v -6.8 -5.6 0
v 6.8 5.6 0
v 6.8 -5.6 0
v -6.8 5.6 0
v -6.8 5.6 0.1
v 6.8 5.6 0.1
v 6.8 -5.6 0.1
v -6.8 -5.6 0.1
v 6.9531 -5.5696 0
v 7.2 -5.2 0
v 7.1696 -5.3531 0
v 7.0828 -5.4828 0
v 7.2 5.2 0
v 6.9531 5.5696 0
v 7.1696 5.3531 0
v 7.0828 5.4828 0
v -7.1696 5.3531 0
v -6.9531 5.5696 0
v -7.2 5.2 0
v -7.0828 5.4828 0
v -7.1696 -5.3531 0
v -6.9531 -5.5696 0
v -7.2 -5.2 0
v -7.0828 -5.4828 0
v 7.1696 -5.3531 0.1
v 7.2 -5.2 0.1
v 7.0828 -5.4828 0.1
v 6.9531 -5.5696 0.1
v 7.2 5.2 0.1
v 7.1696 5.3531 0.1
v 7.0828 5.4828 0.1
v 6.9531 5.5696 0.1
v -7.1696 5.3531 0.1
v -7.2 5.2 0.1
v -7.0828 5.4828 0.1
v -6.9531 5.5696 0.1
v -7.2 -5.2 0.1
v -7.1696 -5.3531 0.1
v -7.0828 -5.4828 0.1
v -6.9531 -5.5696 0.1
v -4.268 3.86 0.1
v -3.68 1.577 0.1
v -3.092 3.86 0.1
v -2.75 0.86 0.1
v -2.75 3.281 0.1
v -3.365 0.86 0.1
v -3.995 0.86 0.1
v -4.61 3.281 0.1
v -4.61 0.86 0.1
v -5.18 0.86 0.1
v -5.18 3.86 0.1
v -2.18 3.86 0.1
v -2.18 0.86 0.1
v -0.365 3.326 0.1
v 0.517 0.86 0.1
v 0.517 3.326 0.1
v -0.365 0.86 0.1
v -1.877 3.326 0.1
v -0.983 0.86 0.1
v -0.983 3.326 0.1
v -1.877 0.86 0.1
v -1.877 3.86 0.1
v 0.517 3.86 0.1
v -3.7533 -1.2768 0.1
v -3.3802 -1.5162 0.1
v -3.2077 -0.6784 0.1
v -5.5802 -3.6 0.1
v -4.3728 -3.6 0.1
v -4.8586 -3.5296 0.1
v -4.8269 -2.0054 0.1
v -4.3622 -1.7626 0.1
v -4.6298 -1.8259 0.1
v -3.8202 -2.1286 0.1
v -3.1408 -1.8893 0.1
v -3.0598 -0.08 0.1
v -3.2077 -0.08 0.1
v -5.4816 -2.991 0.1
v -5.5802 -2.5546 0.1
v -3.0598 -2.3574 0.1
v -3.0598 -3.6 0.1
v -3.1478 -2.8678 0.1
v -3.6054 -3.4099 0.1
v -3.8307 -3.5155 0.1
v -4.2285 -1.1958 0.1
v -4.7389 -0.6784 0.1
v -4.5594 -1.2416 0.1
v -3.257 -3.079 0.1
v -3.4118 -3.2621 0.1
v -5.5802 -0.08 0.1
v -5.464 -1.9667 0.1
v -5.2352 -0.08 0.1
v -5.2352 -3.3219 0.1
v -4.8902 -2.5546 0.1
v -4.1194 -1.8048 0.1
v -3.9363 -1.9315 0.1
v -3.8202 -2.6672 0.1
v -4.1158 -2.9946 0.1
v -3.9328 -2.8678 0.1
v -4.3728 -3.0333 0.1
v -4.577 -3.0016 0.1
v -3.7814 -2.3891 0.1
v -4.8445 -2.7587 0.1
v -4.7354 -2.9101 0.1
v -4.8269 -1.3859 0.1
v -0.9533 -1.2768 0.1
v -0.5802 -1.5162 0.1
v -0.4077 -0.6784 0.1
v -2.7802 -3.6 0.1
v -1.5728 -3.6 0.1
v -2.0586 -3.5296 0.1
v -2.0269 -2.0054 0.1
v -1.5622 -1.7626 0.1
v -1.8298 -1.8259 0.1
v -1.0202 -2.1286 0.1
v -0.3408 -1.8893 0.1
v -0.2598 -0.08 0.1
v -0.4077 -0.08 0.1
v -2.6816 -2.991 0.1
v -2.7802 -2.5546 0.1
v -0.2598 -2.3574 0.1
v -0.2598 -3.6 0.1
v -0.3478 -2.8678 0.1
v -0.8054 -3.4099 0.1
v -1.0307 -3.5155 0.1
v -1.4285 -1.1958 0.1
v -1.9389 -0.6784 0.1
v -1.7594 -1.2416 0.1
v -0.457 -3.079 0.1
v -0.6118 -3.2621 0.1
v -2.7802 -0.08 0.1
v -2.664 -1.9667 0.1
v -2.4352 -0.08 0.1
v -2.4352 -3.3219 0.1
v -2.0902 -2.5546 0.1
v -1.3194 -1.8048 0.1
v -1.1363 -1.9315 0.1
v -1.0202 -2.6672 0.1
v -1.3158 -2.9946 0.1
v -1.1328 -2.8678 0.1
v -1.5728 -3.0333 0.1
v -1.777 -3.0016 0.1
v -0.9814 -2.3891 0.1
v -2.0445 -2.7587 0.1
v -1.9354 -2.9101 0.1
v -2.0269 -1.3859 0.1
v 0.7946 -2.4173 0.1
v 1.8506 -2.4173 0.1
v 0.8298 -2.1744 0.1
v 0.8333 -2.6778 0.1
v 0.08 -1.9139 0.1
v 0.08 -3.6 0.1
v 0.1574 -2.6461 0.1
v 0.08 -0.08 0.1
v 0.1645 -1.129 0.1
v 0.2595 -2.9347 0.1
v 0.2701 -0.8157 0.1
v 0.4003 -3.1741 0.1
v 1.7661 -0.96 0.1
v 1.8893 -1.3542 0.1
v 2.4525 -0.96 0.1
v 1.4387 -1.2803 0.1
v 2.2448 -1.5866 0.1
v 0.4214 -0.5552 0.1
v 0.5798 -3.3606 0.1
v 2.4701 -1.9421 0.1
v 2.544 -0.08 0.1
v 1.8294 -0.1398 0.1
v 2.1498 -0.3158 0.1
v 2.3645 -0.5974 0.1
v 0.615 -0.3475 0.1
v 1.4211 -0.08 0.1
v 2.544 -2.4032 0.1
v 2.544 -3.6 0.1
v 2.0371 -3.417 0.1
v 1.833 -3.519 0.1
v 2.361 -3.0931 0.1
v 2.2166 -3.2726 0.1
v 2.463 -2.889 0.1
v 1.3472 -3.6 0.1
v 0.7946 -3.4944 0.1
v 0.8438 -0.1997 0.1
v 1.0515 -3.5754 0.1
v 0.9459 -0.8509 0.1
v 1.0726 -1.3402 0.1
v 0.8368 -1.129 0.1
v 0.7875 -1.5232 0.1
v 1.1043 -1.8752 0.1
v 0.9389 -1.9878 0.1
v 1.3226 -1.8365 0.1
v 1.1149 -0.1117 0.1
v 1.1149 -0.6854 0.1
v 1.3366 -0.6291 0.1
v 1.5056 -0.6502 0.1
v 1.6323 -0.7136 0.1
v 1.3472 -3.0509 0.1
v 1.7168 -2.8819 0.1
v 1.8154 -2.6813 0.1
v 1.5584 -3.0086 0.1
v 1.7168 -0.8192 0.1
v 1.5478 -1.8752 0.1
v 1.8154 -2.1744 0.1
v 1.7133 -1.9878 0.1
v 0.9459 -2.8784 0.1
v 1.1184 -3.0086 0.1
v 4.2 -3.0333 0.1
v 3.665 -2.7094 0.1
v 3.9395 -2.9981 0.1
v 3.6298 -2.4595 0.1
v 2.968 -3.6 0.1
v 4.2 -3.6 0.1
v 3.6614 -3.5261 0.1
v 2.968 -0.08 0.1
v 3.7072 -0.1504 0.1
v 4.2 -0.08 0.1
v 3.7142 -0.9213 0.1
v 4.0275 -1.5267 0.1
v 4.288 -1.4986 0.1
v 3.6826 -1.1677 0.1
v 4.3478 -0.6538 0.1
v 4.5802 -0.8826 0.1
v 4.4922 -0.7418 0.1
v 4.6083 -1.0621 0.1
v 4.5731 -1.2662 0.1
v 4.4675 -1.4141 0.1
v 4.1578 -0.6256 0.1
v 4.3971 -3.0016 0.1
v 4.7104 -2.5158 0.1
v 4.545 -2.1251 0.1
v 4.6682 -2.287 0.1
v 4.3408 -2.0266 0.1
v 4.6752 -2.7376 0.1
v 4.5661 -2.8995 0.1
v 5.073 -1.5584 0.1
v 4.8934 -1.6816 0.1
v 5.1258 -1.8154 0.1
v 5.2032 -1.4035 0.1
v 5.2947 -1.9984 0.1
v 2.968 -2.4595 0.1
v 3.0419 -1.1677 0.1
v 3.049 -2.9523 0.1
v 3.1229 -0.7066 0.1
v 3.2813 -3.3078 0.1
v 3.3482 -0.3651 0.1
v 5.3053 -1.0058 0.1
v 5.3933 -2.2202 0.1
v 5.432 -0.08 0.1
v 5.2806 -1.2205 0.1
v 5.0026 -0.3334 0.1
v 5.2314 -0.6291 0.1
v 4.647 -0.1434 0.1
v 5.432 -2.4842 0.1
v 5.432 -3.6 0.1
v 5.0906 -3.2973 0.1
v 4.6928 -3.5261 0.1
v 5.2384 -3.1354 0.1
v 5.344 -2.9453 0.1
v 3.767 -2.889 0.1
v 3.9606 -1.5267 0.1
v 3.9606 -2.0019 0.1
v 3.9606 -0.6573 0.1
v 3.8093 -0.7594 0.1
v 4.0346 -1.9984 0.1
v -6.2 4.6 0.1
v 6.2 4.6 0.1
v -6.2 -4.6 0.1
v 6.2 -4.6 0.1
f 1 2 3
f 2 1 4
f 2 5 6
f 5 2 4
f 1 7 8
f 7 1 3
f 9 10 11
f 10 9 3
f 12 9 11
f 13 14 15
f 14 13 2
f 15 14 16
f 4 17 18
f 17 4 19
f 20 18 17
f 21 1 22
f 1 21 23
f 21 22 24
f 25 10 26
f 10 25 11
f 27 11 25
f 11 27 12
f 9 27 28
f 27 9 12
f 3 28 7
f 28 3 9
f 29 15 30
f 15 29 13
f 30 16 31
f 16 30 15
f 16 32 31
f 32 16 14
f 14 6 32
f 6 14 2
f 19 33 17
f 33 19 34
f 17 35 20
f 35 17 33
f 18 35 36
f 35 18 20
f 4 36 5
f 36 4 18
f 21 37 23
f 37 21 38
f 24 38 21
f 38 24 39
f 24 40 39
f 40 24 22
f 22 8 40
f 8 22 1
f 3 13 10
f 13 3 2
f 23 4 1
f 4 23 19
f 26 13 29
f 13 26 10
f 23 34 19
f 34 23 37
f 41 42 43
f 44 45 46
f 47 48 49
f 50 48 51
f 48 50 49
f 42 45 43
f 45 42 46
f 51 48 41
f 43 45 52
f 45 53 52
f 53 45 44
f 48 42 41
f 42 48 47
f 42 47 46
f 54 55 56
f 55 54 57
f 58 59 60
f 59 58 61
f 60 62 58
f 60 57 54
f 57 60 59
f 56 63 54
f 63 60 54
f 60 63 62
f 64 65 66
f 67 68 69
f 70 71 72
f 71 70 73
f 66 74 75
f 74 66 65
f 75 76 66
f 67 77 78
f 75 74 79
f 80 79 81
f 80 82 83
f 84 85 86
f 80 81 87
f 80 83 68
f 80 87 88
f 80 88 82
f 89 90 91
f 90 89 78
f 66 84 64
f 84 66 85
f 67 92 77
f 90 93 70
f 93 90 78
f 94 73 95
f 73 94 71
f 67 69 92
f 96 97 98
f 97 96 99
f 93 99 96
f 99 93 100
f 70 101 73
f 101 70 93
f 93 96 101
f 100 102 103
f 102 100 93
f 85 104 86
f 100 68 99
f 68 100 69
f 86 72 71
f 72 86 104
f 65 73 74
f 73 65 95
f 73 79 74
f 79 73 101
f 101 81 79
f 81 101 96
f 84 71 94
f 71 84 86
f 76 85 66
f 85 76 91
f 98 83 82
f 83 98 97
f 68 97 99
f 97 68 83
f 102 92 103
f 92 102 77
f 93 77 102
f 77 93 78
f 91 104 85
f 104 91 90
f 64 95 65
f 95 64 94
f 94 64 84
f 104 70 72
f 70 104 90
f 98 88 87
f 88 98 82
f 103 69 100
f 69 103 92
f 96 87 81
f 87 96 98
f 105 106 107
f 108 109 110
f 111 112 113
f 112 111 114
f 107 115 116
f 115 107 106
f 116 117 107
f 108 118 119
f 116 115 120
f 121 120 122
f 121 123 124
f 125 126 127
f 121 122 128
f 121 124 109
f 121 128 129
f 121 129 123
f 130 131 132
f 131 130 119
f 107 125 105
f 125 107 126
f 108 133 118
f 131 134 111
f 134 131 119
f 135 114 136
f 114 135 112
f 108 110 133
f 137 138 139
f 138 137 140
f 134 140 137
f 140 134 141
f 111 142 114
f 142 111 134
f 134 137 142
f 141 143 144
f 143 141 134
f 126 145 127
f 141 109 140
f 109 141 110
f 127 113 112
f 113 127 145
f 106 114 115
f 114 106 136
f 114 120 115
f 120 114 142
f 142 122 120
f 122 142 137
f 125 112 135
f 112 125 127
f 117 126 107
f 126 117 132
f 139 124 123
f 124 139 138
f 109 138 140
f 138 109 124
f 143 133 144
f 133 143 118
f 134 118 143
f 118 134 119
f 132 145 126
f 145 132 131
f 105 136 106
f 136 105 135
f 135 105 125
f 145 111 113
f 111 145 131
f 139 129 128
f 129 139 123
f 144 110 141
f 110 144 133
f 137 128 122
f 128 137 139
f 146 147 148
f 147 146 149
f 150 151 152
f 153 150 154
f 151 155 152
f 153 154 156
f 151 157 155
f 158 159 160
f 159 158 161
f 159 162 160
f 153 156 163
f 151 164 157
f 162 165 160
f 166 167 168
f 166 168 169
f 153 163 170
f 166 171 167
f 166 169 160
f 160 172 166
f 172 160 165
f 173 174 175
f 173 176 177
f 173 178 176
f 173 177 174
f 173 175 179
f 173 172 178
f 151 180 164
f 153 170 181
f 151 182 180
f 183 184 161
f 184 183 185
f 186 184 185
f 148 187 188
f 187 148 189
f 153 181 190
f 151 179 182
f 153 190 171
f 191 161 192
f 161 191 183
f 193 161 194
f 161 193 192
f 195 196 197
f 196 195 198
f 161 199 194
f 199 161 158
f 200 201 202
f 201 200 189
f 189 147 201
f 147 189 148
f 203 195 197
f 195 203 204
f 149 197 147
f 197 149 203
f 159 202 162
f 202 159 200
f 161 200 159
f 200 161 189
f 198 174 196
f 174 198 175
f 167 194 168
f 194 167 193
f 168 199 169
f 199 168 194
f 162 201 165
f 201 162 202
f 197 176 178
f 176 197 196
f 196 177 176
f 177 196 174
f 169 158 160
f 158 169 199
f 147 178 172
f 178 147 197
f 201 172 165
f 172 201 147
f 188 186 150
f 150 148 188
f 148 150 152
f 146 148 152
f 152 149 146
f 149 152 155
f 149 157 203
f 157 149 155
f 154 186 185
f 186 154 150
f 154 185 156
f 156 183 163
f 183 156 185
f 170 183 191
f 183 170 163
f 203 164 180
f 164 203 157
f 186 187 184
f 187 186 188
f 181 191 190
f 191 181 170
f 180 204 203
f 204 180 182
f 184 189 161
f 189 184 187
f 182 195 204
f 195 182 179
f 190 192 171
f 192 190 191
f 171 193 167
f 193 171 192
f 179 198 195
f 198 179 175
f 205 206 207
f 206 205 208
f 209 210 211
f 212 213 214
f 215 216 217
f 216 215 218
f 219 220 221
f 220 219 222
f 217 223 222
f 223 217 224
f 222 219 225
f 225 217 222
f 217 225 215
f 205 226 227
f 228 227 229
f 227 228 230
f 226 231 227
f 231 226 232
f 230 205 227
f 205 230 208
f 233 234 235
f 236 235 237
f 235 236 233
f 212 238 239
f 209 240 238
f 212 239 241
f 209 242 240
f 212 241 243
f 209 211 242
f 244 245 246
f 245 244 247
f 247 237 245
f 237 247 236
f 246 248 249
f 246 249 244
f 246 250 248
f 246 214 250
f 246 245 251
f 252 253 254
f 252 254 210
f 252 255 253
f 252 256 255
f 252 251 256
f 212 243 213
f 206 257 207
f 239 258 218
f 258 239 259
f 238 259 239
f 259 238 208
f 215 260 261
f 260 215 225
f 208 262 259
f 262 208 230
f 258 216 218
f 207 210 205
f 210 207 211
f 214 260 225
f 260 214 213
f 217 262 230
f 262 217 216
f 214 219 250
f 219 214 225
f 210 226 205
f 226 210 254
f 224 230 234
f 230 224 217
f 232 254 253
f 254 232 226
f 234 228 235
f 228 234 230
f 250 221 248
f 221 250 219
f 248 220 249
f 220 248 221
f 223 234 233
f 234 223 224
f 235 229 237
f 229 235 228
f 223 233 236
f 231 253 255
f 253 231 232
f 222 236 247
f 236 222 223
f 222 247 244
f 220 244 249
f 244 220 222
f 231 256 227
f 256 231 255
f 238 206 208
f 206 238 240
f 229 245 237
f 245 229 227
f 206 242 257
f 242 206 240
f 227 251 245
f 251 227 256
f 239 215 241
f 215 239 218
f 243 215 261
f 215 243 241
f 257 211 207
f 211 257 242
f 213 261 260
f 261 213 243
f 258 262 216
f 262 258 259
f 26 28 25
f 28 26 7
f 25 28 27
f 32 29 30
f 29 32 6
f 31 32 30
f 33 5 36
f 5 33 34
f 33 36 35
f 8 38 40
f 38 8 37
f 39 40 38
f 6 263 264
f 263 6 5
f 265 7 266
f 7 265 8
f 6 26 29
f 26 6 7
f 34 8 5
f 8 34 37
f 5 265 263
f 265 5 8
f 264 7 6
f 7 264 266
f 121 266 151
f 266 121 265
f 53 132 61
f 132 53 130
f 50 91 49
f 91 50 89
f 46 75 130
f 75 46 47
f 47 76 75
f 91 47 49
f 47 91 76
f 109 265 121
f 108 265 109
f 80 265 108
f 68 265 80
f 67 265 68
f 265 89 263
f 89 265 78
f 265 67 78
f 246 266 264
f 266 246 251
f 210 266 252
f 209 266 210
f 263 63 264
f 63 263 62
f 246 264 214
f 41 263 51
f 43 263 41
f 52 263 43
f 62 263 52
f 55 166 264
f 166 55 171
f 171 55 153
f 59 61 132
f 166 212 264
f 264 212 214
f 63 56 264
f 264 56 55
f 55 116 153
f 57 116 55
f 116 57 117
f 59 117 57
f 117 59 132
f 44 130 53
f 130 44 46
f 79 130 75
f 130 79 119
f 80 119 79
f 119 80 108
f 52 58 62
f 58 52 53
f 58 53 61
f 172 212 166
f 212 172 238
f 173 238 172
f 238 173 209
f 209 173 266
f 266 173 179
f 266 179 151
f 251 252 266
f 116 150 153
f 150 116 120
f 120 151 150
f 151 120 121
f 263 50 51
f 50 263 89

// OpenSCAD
// file: ../p/type-swiss721bt-bold-ut.scad
use <../lib.scad>
function ldraw_lib__type_swiss721bt_bold_ut() = [
// 0 Type Swiss721BT Upper Case "T" Bold
// 0 Name: type-swiss721bt-bold-ut.dat
// 0 Author: Ulrich Röder [UR]
// 0 !LDRAW_ORG Primitive UPDATE 2019-03
// 0 !LICENSE Licensed under CC BY 4.0 : see CAreadme.txt
// 
// 0 BFC CERTIFY CCW
  [0,"BFC","CERTIFY"],
  [0,"BFC","CCW"],
// 
// 0 !HISTORY 2019-12-27 [PTadmin] Official Update 2019-03
// 
// 
// 0 // Main
// 4 16 .105 0 .322 .105 0 -.5 .399 0 -.5 .399 0 .322
  [4,16,.105,0,.322,.105,0,-.5,.399,0,-.5,.399,0,.322],
// 4 16 -.101 0 -.5 -.101 0 .322 -.399 0 .322 -.399 0 -.5
  [4,16,-.101,0,-.5,-.101,0,.322,-.399,0,.322,-.399,0,-.5],
// 
// 0 // Black
// 3 0 -.101 0 .322 -.399 0 .5 -.399 0 .322
  [3,0,-.101,0,.322,-.399,0,.5,-.399,0,.322],
// 4 0 .105 0 .322 -.101 0 .322 -.101 0 -.5 .105 0 -.5
  [4,0,.105,0,.322,-.101,0,.322,-.101,0,-.5,.105,0,-.5],
// 3 0 .399 0 .322 .399 0 .5 .105 0 .322
  [3,0,.399,0,.322,.399,0,.5,.105,0,.322],
// 4 0 .105 0 .322 .399 0 .5 -.399 0 .5 -.101 0 .322
  [4,0,.105,0,.322,.399,0,.5,-.399,0,.5,-.101,0,.322],
];
module ldraw_lib__type_swiss721bt_bold_ut(step=0, col=false, unit=2/5, alt=false, line=0.2, solid=!$preview)
    makepoly(ldraw_lib__type_swiss721bt_bold_ut(), step=step, col=col, unit=unit, alt=alt, line=line, solid=solid);
ldraw_lib__type_swiss721bt_bold_ut(line=0.2);
// file: ../p/type-swiss721bt-bold-um.scad
use <../lib.scad>
function ldraw_lib__type_swiss721bt_bold_um() = [
// 0 Type Swiss721BT Upper Case "M" Bold
// 0 Name: type-swiss721bt-bold-um.dat
// 0 Author: Ulrich Röder [UR]
// 0 !LDRAW_ORG Primitive UPDATE 2019-03
// 0 !LICENSE Licensed under CC BY 4.0 : see CAreadme.txt
// 
// 0 BFC CERTIFY CCW
  [0,"BFC","CERTIFY"],
  [0,"BFC","CCW"],
// 
// 0 !HISTORY 2019-12-27 [PTadmin] Official Update 2019-03
// 
// 
// 0 // Main
// 3 16 -.196 0 .5 0 0 -.261 .196 0 .5
  [3,16,-.196,0,.5,0,0,-.261,.196,0,.5],
// 3 16 .31 0 -.5 .31 0 .307 .105 0 -.5
  [3,16,.31,0,-.5,.31,0,.307,.105,0,-.5],
// 3 16 -.105 0 -.5 -.31 0 .307 -.31 0 -.5
  [3,16,-.105,0,-.5,-.31,0,.307,-.31,0,-.5],
// 
// 0 // Black
// 4 0 -.31 0 -.5 -.31 0 .307 -.5 0 .5 -.5 0 -.5
  [4,0,-.31,0,-.5,-.31,0,.307,-.5,0,.5,-.5,0,-.5],
// 4 0 .105 0 -.5 .31 0 .307 .196 0 .5 0 0 -.261
  [4,0,.105,0,-.5,.31,0,.307,.196,0,.5,0,0,-.261],
// 3 0 -.5 0 .5 -.31 0 .307 -.196 0 .5
  [3,0,-.5,0,.5,-.31,0,.307,-.196,0,.5],
// 3 0 .196 0 .5 .31 0 .307 .5 0 .5
  [3,0,.196,0,.5,.31,0,.307,.5,0,.5],
// 4 0 .5 0 -.5 .5 0 .5 .31 0 .307 .31 0 -.5
  [4,0,.5,0,-.5,.5,0,.5,.31,0,.307,.31,0,-.5],
// 4 0 -.31 0 .307 -.105 0 -.5 0 0 -.261 -.196 0 .5
  [4,0,-.31,0,.307,-.105,0,-.5,0,0,-.261,-.196,0,.5],
// 3 0 0 0 -.261 -.105 0 -.5 .105 0 -.5
  [3,0,0,0,-.261,-.105,0,-.5,.105,0,-.5],
];
module ldraw_lib__type_swiss721bt_bold_um(step=0, col=false, unit=2/5, alt=false, line=0.2, solid=!$preview)
    makepoly(ldraw_lib__type_swiss721bt_bold_um(), step=step, col=col, unit=unit, alt=alt, line=line, solid=solid);
ldraw_lib__type_swiss721bt_bold_um(line=0.2);
// file: ../p/type-swiss721bt-bold-n5.scad
use <../lib.scad>
function ldraw_lib__type_swiss721bt_bold_n5() = [
// 0 Type Swiss721BT Number "5" Bold
// 0 Name: type-swiss721bt-bold-n5.dat
// 0 Author: Ulrich Röder [UR]
// 0 !LDRAW_ORG Primitive UPDATE 2019-02
// 0 !LICENSE Licensed under CC BY 4.0 : see CAreadme.txt
// 
// 0 BFC CERTIFY CCW
  [0,"BFC","CERTIFY"],
  [0,"BFC","CCW"],
// 
// 0 !HISTORY 2019-09-09 [PTadmin] Official Update 2019-02
// 
// 
// 0 // Main
// 3 16 .161 0 .16 .267 0 .092 .316 0 .33
  [3,16,.161,0,.16,.267,0,.092,.316,0,.33],
// 3 16 -.358 0 -.5 -.015 0 -.5 -.153 0 -.48
  [3,16,-.358,0,-.5,-.015,0,-.5,-.153,0,-.48],
// 4 16 .142 0 -.082 -.012 0 .022 -.088 0 .004 -.144 0 -.047
  [4,16,.142,0,-.082,-.012,0,.022,-.088,0,.004,-.144,0,-.047],
// 4 16 .358 0 .5 .316 0 .33 .267 0 .092 .335 0 -.014
  [4,16,.358,0,.5,.316,0,.33,.267,0,.092,.335,0,-.014],
// 3 16 .358 0 .5 .316 0 .5 .316 0 .33
  [3,16,.358,0,.5,.316,0,.5,.316,0,.33],
// 3 16 -.358 0 -.5 -.33 0 -.327 -.358 0 -.203
  [3,16,-.358,0,-.5,-.33,0,-.327,-.358,0,-.203],
// 3 16 .358 0 .5 .335 0 -.014 .358 0 -.147
  [3,16,.358,0,.5,.335,0,-.014,.358,0,-.147],
// 3 16 .358 0 -.5 .358 0 -.147 .333 0 -.292
  [3,16,.358,0,-.5,.358,0,-.147,.333,0,-.292],
// 3 16 .358 0 -.5 .203 0 -.446 .139 0 -.476
  [3,16,.358,0,-.5,.203,0,-.446,.139,0,-.476],
// 3 16 .026 0 .183 -.119 0 .33 -.068 0 .17
  [3,16,.026,0,.183,-.119,0,.33,-.068,0,.17],
// 3 16 .358 0 -.5 .333 0 -.292 .302 0 -.352
  [3,16,.358,0,-.5,.333,0,-.292,.302,0,-.352],
// 3 16 .358 0 -.5 .139 0 -.476 -.015 0 -.5
  [3,16,.358,0,-.5,.139,0,-.476,-.015,0,-.5],
// 3 16 .358 0 -.5 .302 0 -.352 .258 0 -.404
  [3,16,.358,0,-.5,.302,0,-.352,.258,0,-.404],
// 3 16 .358 0 -.5 .258 0 -.404 .203 0 -.446
  [3,16,.358,0,-.5,.258,0,-.404,.203,0,-.446],
// 4 16 -.358 0 -.203 -.325 0 -.036 -.26 0 .5 -.358 0 .5
  [4,16,-.358,0,-.203,-.325,0,-.036,-.26,0,.5,-.358,0,.5],
// 4 16 .161 0 .16 .316 0 .33 -.119 0 .33 .026 0 .183
  [4,16,.161,0,.16,.316,0,.33,-.119,0,.33,.026,0,.183],
// 3 16 -.358 0 -.5 -.26 0 -.421 -.33 0 -.327
  [3,16,-.358,0,-.5,-.26,0,-.421,-.33,0,-.327],
// 4 16 -.144 0 -.047 -.325 0 -.036 -.358 0 -.203 -.162 0 -.203
  [4,16,-.144,0,-.047,-.325,0,-.036,-.358,0,-.203,-.162,0,-.203],
// 4 16 -.012 0 .022 .142 0 -.082 .109 0 -.026 .057 0 .01
  [4,16,-.012,0,.022,.142,0,-.082,.109,0,-.026,.057,0,.01],
// 3 16 -.358 0 -.5 -.153 0 -.48 -.26 0 -.421
  [3,16,-.358,0,-.5,-.153,0,-.48,-.26,0,-.421],
// 4 16 -.015 0 -.339 .058 0 -.328 .11 0 -.292 .142 0 -.235
  [4,16,-.015,0,-.339,.058,0,-.328,.11,0,-.292,.142,0,-.235],
// 4 16 -.073 0 -.33 -.015 0 -.339 .142 0 -.235 -.162 0 -.203
  [4,16,-.073,0,-.33,-.015,0,-.339,.142,0,-.235,-.162,0,-.203],
// 4 16 -.144 0 -.047 -.162 0 -.203 .153 0 -.156 .142 0 -.082
  [4,16,-.144,0,-.047,-.162,0,-.203,.153,0,-.156,.142,0,-.082],
// 3 16 -.162 0 -.203 .142 0 -.235 .153 0 -.156
  [3,16,-.162,0,-.203,.142,0,-.235,.153,0,-.156],
// 4 16 -.118 0 -.304 -.073 0 -.33 -.162 0 -.203 -.149 0 -.261
  [4,16,-.118,0,-.304,-.073,0,-.33,-.162,0,-.203,-.149,0,-.261],
// 3 16 -.119 0 .33 -.144 0 .129 -.068 0 .17
  [3,16,-.119,0,.33,-.144,0,.129,-.068,0,.17],
// 
// 0 // Black
// 4 0 -.153 0 -.48 -.015 0 -.5 -.015 0 -.339 -.073 0 -.33
  [4,0,-.153,0,-.48,-.015,0,-.5,-.015,0,-.339,-.073,0,-.33],
// 4 0 -.144 0 .129 -.088 0 .004 -.012 0 .022 -.068 0 .17
  [4,0,-.144,0,.129,-.088,0,.004,-.012,0,.022,-.068,0,.17],
// 4 0 .109 0 -.026 .142 0 -.082 .335 0 -.014 .267 0 .092
  [4,0,.109,0,-.026,.142,0,-.082,.335,0,-.014,.267,0,.092],
// 4 0 .335 0 -.014 .142 0 -.082 .153 0 -.156 .358 0 -.147
  [4,0,.335,0,-.014,.142,0,-.082,.153,0,-.156,.358,0,-.147],
// 4 0 .142 0 -.235 .333 0 -.292 .358 0 -.147 .153 0 -.156
  [4,0,.142,0,-.235,.333,0,-.292,.358,0,-.147,.153,0,-.156],
// 4 0 -.068 0 .17 -.012 0 .022 .057 0 .01 .026 0 .183
  [4,0,-.068,0,.17,-.012,0,.022,.057,0,.01,.026,0,.183],
// 4 0 -.26 0 .5 -.119 0 .33 .316 0 .33 .316 0 .5
  [4,0,-.26,0,.5,-.119,0,.33,.316,0,.33,.316,0,.5],
// 4 0 .203 0 -.446 .11 0 -.292 .058 0 -.328 .139 0 -.476
  [4,0,.203,0,-.446,.11,0,-.292,.058,0,-.328,.139,0,-.476],
// 4 0 -.015 0 -.339 -.015 0 -.5 .139 0 -.476 .058 0 -.328
  [4,0,-.015,0,-.339,-.015,0,-.5,.139,0,-.476,.058,0,-.328],
// 4 0 -.118 0 -.304 -.149 0 -.261 -.33 0 -.327 -.26 0 -.421
  [4,0,-.118,0,-.304,-.149,0,-.261,-.33,0,-.327,-.26,0,-.421],
// 4 0 -.358 0 -.203 -.33 0 -.327 -.149 0 -.261 -.162 0 -.203
  [4,0,-.358,0,-.203,-.33,0,-.327,-.149,0,-.261,-.162,0,-.203],
// 4 0 -.119 0 .33 -.26 0 .5 -.325 0 -.036 -.144 0 .129
  [4,0,-.119,0,.33,-.26,0,.5,-.325,0,-.036,-.144,0,.129],
// 4 0 .267 0 .092 .161 0 .16 .057 0 .01 .109 0 -.026
  [4,0,.267,0,.092,.161,0,.16,.057,0,.01,.109,0,-.026],
// 3 0 .057 0 .01 .161 0 .16 .026 0 .183
  [3,0,.057,0,.01,.161,0,.16,.026,0,.183],
// 4 0 -.325 0 -.036 -.144 0 -.047 -.088 0 .004 -.144 0 .129
  [4,0,-.325,0,-.036,-.144,0,-.047,-.088,0,.004,-.144,0,.129],
// 4 0 .302 0 -.352 .11 0 -.292 .203 0 -.446 .258 0 -.404
  [4,0,.302,0,-.352,.11,0,-.292,.203,0,-.446,.258,0,-.404],
// 4 0 -.26 0 -.421 -.153 0 -.48 -.073 0 -.33 -.118 0 -.304
  [4,0,-.26,0,-.421,-.153,0,-.48,-.073,0,-.33,-.118,0,-.304],
// 4 0 .333 0 -.292 .142 0 -.235 .11 0 -.292 .302 0 -.352
  [4,0,.333,0,-.292,.142,0,-.235,.11,0,-.292,.302,0,-.352],
];
module ldraw_lib__type_swiss721bt_bold_n5(step=0, col=false, unit=2/5, alt=false, line=0.2, solid=!$preview)
    makepoly(ldraw_lib__type_swiss721bt_bold_n5(), step=step, col=col, unit=unit, alt=alt, line=line, solid=solid);
ldraw_lib__type_swiss721bt_bold_n5(line=0.2);
// file: ../p/type-swiss721bt-bold-n3.scad
use <../lib.scad>
function ldraw_lib__type_swiss721bt_bold_n3() = [
// 0 Type Swiss721BT Number "3" Bold
// 0 Name: type-swiss721bt-bold-n3.dat
// 0 Author: Ulrich Röder [UR]
// 0 !LDRAW_ORG Primitive UPDATE 2019-01
// 0 !LICENSE Licensed under CC BY 4.0 : see CAreadme.txt
// 
// 0 BFC CERTIFY CCW
  [0,"BFC","CERTIFY"],
  [0,"BFC","CCW"],
// 
// 0 !HISTORY 2019-06-28 [PTadmin] Official Update 2019-01
// 
// 
// 0 // Main
// 4 16 -.074 0 -.329 0 0 -.339 -.162 0 -.176 -.152 0 -.247
  [4,16,-.074,0,-.329,0,0,-.339,-.162,0,-.176,-.152,0,-.247],
// 3 16 -.35 0 -.5 0 0 -.5 -.153 0 -.479
  [3,16,-.35,0,-.5,0,0,-.5,-.153,0,-.479],
// 3 16 -.35 0 .5 -.14 0 .48 0 0 .5
  [3,16,-.35,0,.5,-.14,0,.48,0,0,.5],
// 4 16 -.049 0 .089 .025 0 .097 -.138 0 .261 -.147 0 .191
  [4,16,-.049,0,.089,.025,0,.097,-.138,0,.261,-.147,0,.191],
// 4 16 .116 0 .221 .108 0 .272 .083 0 .312 .042 0 .337
  [4,16,.116,0,.221,.108,0,.272,.083,0,.312,.042,0,.337],
// 4 16 .076 0 .121 .106 0 .163 .116 0 .221 .025 0 .097
  [4,16,.076,0,.121,.106,0,.163,.116,0,.221,.025,0,.097],
// 3 16 .116 0 .221 .042 0 .337 -.012 0 .345
  [3,16,.116,0,.221,.042,0,.337,-.012,0,.345],
// 4 16 -.138 0 .261 .025 0 .097 .116 0 .221 -.012 0 .345
  [4,16,-.138,0,.261,.025,0,.097,.116,0,.221,-.012,0,.345],
// 3 16 0 0 -.339 .056 0 -.33 .145 0 -.192
  [3,16,0,0,-.339,.056,0,-.33,.145,0,-.192],
// 4 16 .098 0 -.081 .04 0 -.053 .145 0 -.192 .133 0 -.127
  [4,16,.098,0,-.081,.04,0,-.053,.145,0,-.192,.133,0,-.127],
// 4 16 .104 0 -.301 .135 0 -.255 .145 0 -.192 .056 0 -.33
  [4,16,.104,0,-.301,.135,0,-.255,.145,0,-.192,.056,0,-.33],
// 4 16 -.162 0 -.176 0 0 -.339 .145 0 -.192 .04 0 -.053
  [4,16,-.162,0,-.176,0,0,-.339,.145,0,-.192,.04,0,-.053],
// 3 16 .248 0 .08 .197 0 .045 .263 0 .007
  [3,16,.248,0,.08,.197,0,.045,.263,0,.007],
// 4 16 .311 0 -.045 .285 0 .124 .248 0 .08 .263 0 .007
  [4,16,.311,0,-.045,.285,0,.124,.248,0,.08,.263,0,.007],
// 3 16 -.35 0 .5 -.35 0 -.176 -.329 0 .191
  [3,16,-.35,0,.5,-.35,0,-.176,-.329,0,.191],
// 3 16 -.35 0 -.5 -.327 0 -.316 -.35 0 -.176
  [3,16,-.35,0,-.5,-.327,0,-.316,-.35,0,-.176],
// 3 16 -.35 0 .5 -.329 0 .191 -.306 0 .322
  [3,16,-.35,0,.5,-.329,0,.191,-.306,0,.322],
// 3 16 -.35 0 -.5 -.261 0 -.417 -.327 0 -.316
  [3,16,-.35,0,-.5,-.261,0,-.417,-.327,0,-.316],
// 3 16 -.35 0 .5 -.306 0 .322 -.242 0 .419
  [3,16,-.35,0,.5,-.306,0,.322,-.242,0,.419],
// 3 16 -.35 0 -.5 -.153 0 -.479 -.261 0 -.417
  [3,16,-.35,0,-.5,-.153,0,-.479,-.261,0,-.417],
// 4 16 .35 0 .5 .314 0 .237 .307 0 .176 .339 0 -.108
  [4,16,.35,0,.5,.314,0,.237,.307,0,.176,.339,0,-.108],
// 4 16 .285 0 .124 .311 0 -.045 .339 0 -.108 .307 0 .176
  [4,16,.285,0,.124,.311,0,-.045,.339,0,-.108,.307,0,.176],
// 3 16 .35 0 .5 .228 0 .428 .293 0 .344
  [3,16,.35,0,.5,.228,0,.428,.293,0,.344],
// 3 16 .35 0 .5 .293 0 .344 .314 0 .237
  [3,16,.35,0,.5,.293,0,.344,.314,0,.237],
// 3 16 .35 0 .5 .127 0 .482 .228 0 .428
  [3,16,.35,0,.5,.127,0,.482,.228,0,.428],
// 3 16 .35 0 .5 0 0 .5 .127 0 .482
  [3,16,.35,0,.5,0,0,.5,.127,0,.482],
// 3 16 .35 0 .5 .339 0 -.108 .35 0 -.183
  [3,16,.35,0,.5,.339,0,-.108,.35,0,-.183],
// 3 16 .35 0 -.5 .253 0 -.414 .14 0 -.479
  [3,16,.35,0,-.5,.253,0,-.414,.14,0,-.479],
// 3 16 .35 0 -.5 .14 0 -.479 0 0 -.5
  [3,16,.35,0,-.5,.14,0,-.479,0,0,-.5],
// 3 16 .35 0 -.5 .295 0 -.368 .253 0 -.414
  [3,16,.35,0,-.5,.295,0,-.368,.253,0,-.414],
// 3 16 .35 0 -.5 .325 0 -.314 .295 0 -.368
  [3,16,.35,0,-.5,.325,0,-.314,.295,0,-.368],
// 3 16 .35 0 -.5 .35 0 -.183 .325 0 -.314
  [3,16,.35,0,-.5,.35,0,-.183,.325,0,-.314],
// 3 16 -.35 0 .5 -.242 0 .419 -.14 0 .48
  [3,16,-.35,0,.5,-.242,0,.419,-.14,0,.48],
// 3 16 -.152 0 -.247 -.123 0 -.298 -.074 0 -.329
  [3,16,-.152,0,-.247,-.123,0,-.298,-.074,0,-.329],
// 4 16 -.068 0 -.046 -.068 0 .089 -.147 0 .191 -.329 0 .191
  [4,16,-.068,0,-.046,-.068,0,.089,-.147,0,.191,-.329,0,.191],
// 4 16 -.162 0 -.176 -.068 0 -.046 -.329 0 .191 -.35 0 -.176
  [4,16,-.162,0,-.176,-.068,0,-.046,-.329,0,.191,-.35,0,-.176],
// 4 16 -.012 0 .345 -.068 0 .336 -.111 0 .307 -.138 0 .261
  [4,16,-.012,0,.345,-.068,0,.336,-.111,0,.307,-.138,0,.261],
// 4 16 .04 0 -.053 -.047 0 -.045 -.068 0 -.046 -.162 0 -.176
  [4,16,.04,0,-.053,-.047,0,-.045,-.068,0,-.046,-.162,0,-.176],
// 3 16 -.068 0 .089 -.049 0 .089 -.147 0 .191
  [3,16,-.068,0,.089,-.049,0,.089,-.147,0,.191],
// 
// 0 // Black
// 4 0 0 0 -.339 -.074 0 -.329 -.153 0 -.479 0 0 -.5
  [4,0,0,0,-.339,-.074,0,-.329,-.153,0,-.479,0,0,-.5],
// 4 0 -.14 0 .48 -.068 0 .336 -.012 0 .345 0 0 .5
  [4,0,-.14,0,.48,-.068,0,.336,-.012,0,.345,0,0,.5],
// 4 0 -.049 0 .089 -.047 0 -.045 .04 0 -.053 .025 0 .097
  [4,0,-.049,0,.089,-.047,0,-.045,.04,0,-.053,.025,0,.097],
// 4 0 .127 0 .482 0 0 .5 -.012 0 .345 .042 0 .337
  [4,0,.127,0,.482,0,0,.5,-.012,0,.345,.042,0,.337],
// 4 0 .14 0 -.479 .056 0 -.33 0 0 -.339 0 0 -.5
  [4,0,.14,0,-.479,.056,0,-.33,0,0,-.339,0,0,-.5],
// 4 0 .197 0 .045 .076 0 .121 .025 0 .097 .04 0 -.053
  [4,0,.197,0,.045,.076,0,.121,.025,0,.097,.04,0,-.053],
// 4 0 .253 0 -.414 .104 0 -.301 .056 0 -.33 .14 0 -.479
  [4,0,.253,0,-.414,.104,0,-.301,.056,0,-.33,.14,0,-.479],
// 4 0 .263 0 .007 .197 0 .045 .04 0 -.053 .098 0 -.081
  [4,0,.263,0,.007,.197,0,.045,.04,0,-.053,.098,0,-.081],
// 4 0 .042 0 .337 .083 0 .312 .228 0 .428 .127 0 .482
  [4,0,.042,0,.337,.083,0,.312,.228,0,.428,.127,0,.482],
// 4 0 .293 0 .344 .228 0 .428 .083 0 .312 .108 0 .272
  [4,0,.293,0,.344,.228,0,.428,.083,0,.312,.108,0,.272],
// 4 0 .076 0 .121 .197 0 .045 .248 0 .08 .106 0 .163
  [4,0,.076,0,.121,.197,0,.045,.248,0,.08,.106,0,.163],
// 4 0 .311 0 -.045 .263 0 .007 .098 0 -.081 .133 0 -.127
  [4,0,.311,0,-.045,.263,0,.007,.098,0,-.081,.133,0,-.127],
// 3 0 .106 0 .163 .248 0 .08 .285 0 .124
  [3,0,.106,0,.163,.248,0,.08,.285,0,.124],
// 4 0 .104 0 -.301 .253 0 -.414 .295 0 -.368 .135 0 -.255
  [4,0,.104,0,-.301,.253,0,-.414,.295,0,-.368,.135,0,-.255],
// 4 0 .106 0 .163 .285 0 .124 .307 0 .176 .116 0 .221
  [4,0,.106,0,.163,.285,0,.124,.307,0,.176,.116,0,.221],
// 3 0 .116 0 .221 .307 0 .176 .314 0 .237
  [3,0,.116,0,.221,.307,0,.176,.314,0,.237],
// 4 0 .293 0 .344 .108 0 .272 .116 0 .221 .314 0 .237
  [4,0,.293,0,.344,.108,0,.272,.116,0,.221,.314,0,.237],
// 4 0 .295 0 -.368 .325 0 -.314 .145 0 -.192 .135 0 -.255
  [4,0,.295,0,-.368,.325,0,-.314,.145,0,-.192,.135,0,-.255],
// 4 0 -.162 0 -.176 -.35 0 -.176 -.327 0 -.316 -.152 0 -.247
  [4,0,-.162,0,-.176,-.35,0,-.176,-.327,0,-.316,-.152,0,-.247],
// 4 0 .311 0 -.045 .133 0 -.127 .145 0 -.192 .339 0 -.108
  [4,0,.311,0,-.045,.133,0,-.127,.145,0,-.192,.339,0,-.108],
// 4 0 -.123 0 -.298 -.152 0 -.247 -.327 0 -.316 -.261 0 -.417
  [4,0,-.123,0,-.298,-.152,0,-.247,-.327,0,-.316,-.261,0,-.417],
// 4 0 .339 0 -.108 .145 0 -.192 .325 0 -.314 .35 0 -.183
  [4,0,.339,0,-.108,.145,0,-.192,.325,0,-.314,.35,0,-.183],
// 4 0 -.329 0 .191 -.147 0 .191 -.138 0 .261 -.306 0 .322
  [4,0,-.329,0,.191,-.147,0,.191,-.138,0,.261,-.306,0,.322],
// 4 0 -.111 0 .307 -.242 0 .419 -.306 0 .322 -.138 0 .261
  [4,0,-.111,0,.307,-.242,0,.419,-.306,0,.322,-.138,0,.261],
// 4 0 -.261 0 -.417 -.153 0 -.479 -.074 0 -.329 -.123 0 -.298
  [4,0,-.261,0,-.417,-.153,0,-.479,-.074,0,-.329,-.123,0,-.298],
// 4 0 -.242 0 .419 -.111 0 .307 -.068 0 .336 -.14 0 .48
  [4,0,-.242,0,.419,-.111,0,.307,-.068,0,.336,-.14,0,.48],
// 4 0 -.049 0 .089 -.068 0 .089 -.068 0 -.046 -.047 0 -.045
  [4,0,-.049,0,.089,-.068,0,.089,-.068,0,-.046,-.047,0,-.045],
];
module ldraw_lib__type_swiss721bt_bold_n3(step=0, col=false, unit=2/5, alt=false, line=0.2, solid=!$preview)
    makepoly(ldraw_lib__type_swiss721bt_bold_n3(), step=step, col=col, unit=unit, alt=alt, line=line, solid=solid);
ldraw_lib__type_swiss721bt_bold_n3(line=0.2);
// file: ../p/box3u12.scad
use <../lib.scad>
function ldraw_lib__box3u12() = [
// 0 Box with 3 Parallel Faces without Any Edges
// 0 Name: box3u12.dat
// 0 Author: J.C. Tchang [tchang]
// 0 !LDRAW_ORG Primitive UPDATE 2014-02
// 0 !LICENSE Licensed under CC BY 4.0 : see CAreadme.txt
// 
// 0 BFC CERTIFY CCW
  [0,"BFC","CERTIFY"],
  [0,"BFC","CCW"],
// 
// 0 !HISTORY 2014-12-23 [PTadmin] Official Update 2014-02
// 
// 
// 4 16 -1 1 1 1 1 1 1 1 -1 -1 1 -1
  [4,16,-1,1,1,1,1,1,1,1,-1,-1,1,-1],
// 4 16 -1 1 1 -1 0 1 1 0 1 1 1 1
  [4,16,-1,1,1,-1,0,1,1,0,1,1,1,1],
// 4 16 1 1 -1 1 0 -1 -1 0 -1 -1 1 -1
  [4,16,1,1,-1,1,0,-1,-1,0,-1,-1,1,-1],
];
module ldraw_lib__box3u12(step=0, col=false, unit=2/5, alt=false, line=0.2, solid=!$preview)
    makepoly(ldraw_lib__box3u12(), step=step, col=col, unit=unit, alt=alt, line=line, solid=solid);
ldraw_lib__box3u12(line=0.2);
// file: ../p/1-4cyli.scad
use <../lib.scad>
function ldraw_lib__1_4cyli() = [
// 0 Cylinder 0.25
// 0 Name: 1-4cyli.dat
// 0 Author: James Jessiman
// 0 !LDRAW_ORG Primitive UPDATE 2012-01
// 0 !LICENSE Licensed under CC BY 4.0 : see CAreadme.txt
// 
// 0 BFC CERTIFY CCW
  [0,"BFC","CERTIFY"],
  [0,"BFC","CCW"],
// 
// 0 !HISTORY 2002-03-23 [sbliss] Added BFC statement.
// 0 !HISTORY 2002-04-25 [PTadmin] Official Update 2002-02
// 0 !HISTORY 2007-06-22 [PTadmin] Header formatted for Contributor Agreement
// 0 !HISTORY 2008-07-01 [PTadmin] Official Update 2008-01
// 0 !HISTORY 2012-02-16 [Philo] Changed to CCW
// 0 !HISTORY 2012-03-30 [PTadmin] Official Update 2012-01
// 
// 
// 4 16 1 1 0 0.9239 1 0.3827 0.9239 0 0.3827 1 0 0
  [4,16,1,1,0,0.9239,1,0.3827,0.9239,0,0.3827,1,0,0],
// 5 24 1 0 0 1 1 0 0.9239 0 0.3827 1 0 -1
  [5,24,1,0,0,1,1,0,0.9239,0,0.3827,1,0,-1],
// 4 16 0.9239 1 0.3827 0.7071 1 0.7071 0.7071 0 0.7071 0.9239 0 0.3827
  [4,16,0.9239,1,0.3827,0.7071,1,0.7071,0.7071,0,0.7071,0.9239,0,0.3827],
// 5 24 0.9239 0 0.3827 0.9239 1 0.3827 0.7071 0 0.7071 1 0 0
  [5,24,0.9239,0,0.3827,0.9239,1,0.3827,0.7071,0,0.7071,1,0,0],
// 4 16 0.7071 1 0.7071 0.3827 1 0.9239 0.3827 0 0.9239 0.7071 0 0.7071
  [4,16,0.7071,1,0.7071,0.3827,1,0.9239,0.3827,0,0.9239,0.7071,0,0.7071],
// 5 24 0.7071 0 0.7071 0.7071 1 0.7071 0.3827 0 0.9239 0.9239 0 0.3827
  [5,24,0.7071,0,0.7071,0.7071,1,0.7071,0.3827,0,0.9239,0.9239,0,0.3827],
// 4 16 0.3827 1 0.9239 0 1 1 0 0 1 0.3827 0 0.9239
  [4,16,0.3827,1,0.9239,0,1,1,0,0,1,0.3827,0,0.9239],
// 5 24 0.3827 0 0.9239 0.3827 1 0.9239 0 0 1 0.7071 0 0.7071
  [5,24,0.3827,0,0.9239,0.3827,1,0.9239,0,0,1,0.7071,0,0.7071],
// 5 24 0 0 1 0 1 1 0.3827 0 0.9239 -1 0 1
  [5,24,0,0,1,0,1,1,0.3827,0,0.9239,-1,0,1],
];
module ldraw_lib__1_4cyli(step=0, col=false, unit=2/5, alt=false, line=0.2, solid=!$preview)
    makepoly(ldraw_lib__1_4cyli(), step=step, col=col, unit=unit, alt=alt, line=line, solid=solid);
ldraw_lib__1_4cyli(line=0.2);
// file: ../p/1-4chrd.scad
use <../lib.scad>
function ldraw_lib__1_4chrd() = [
// 0 Chord 0.25
// 0 Name: 1-4chrd.dat
// 0 Author: Tony Hafner [hafhead]
// 0 !LDRAW_ORG Primitive UPDATE 2012-02
// 0 !LICENSE Licensed under CC BY 2.0 and CC BY 4.0 : see CAreadme.txt
// 
// 0 BFC CERTIFY CCW
  [0,"BFC","CERTIFY"],
  [0,"BFC","CCW"],
// 
// 0 !HISTORY 2004-04-22 [PTadmin] Official Update 2004-02
// 0 !HISTORY 2007-10-09 [PTadmin] Header formatted for Contributor Agreement
// 0 !HISTORY 2008-07-01 [PTadmin] Official Update 2008-01
// 0 !HISTORY 2012-08-02 [MMR1988] Re-creation with PrimGen2 and Rectifier
// 0 !HISTORY 2012-08-09 [PTadmin] Official Update 2012-02
// 
// 
// 4 16 0.9239 0 0.3827 0.3827 0 0.9239 0 0 1 1 0 0
  [4,16,0.9239,0,0.3827,0.3827,0,0.9239,0,0,1,1,0,0],
// 3 16 0.7071 0 0.7071 0.3827 0 0.9239 0.9239 0 0.3827
  [3,16,0.7071,0,0.7071,0.3827,0,0.9239,0.9239,0,0.3827],
];
module ldraw_lib__1_4chrd(step=0, col=false, unit=2/5, alt=false, line=0.2, solid=!$preview)
    makepoly(ldraw_lib__1_4chrd(), step=step, col=col, unit=unit, alt=alt, line=line, solid=solid);
ldraw_lib__1_4chrd(line=0.2);
// main file
use <../lib.scad>
use <../p/1-4chrd.scad>
use <../p/1-4cyli.scad>
use <../p/box3u12.scad>
use <../p/type-swiss721bt-bold-n3.scad>
use <../p/type-swiss721bt-bold-n5.scad>
use <../p/type-swiss721bt-bold-n6.scad>
use <../p/type-swiss721bt-bold-um.scad>
use <../p/type-swiss721bt-bold-ut.scad>
function ldraw_lib__4121723i() = [
// 0 Sticker  1.4 x  1.8 with Black "MT 5563" on White Background
// 0 Name: 4121723i.dat
// 0 Author: Ulrich Röder [UR]
// 0 !LDRAW_ORG Part UPDATE 2022-01
// 0 !LICENSE Licensed under CC BY 4.0 : see CAreadme.txt
// 
// 0 BFC CERTIFY CCW
  [0,"BFC","CERTIFY"],
  [0,"BFC","CCW"],
// 
// 0 !KEYWORDS Model Team, Racing Truck, Set 5563
// 
// 0 !HISTORY 2022-01-14 [PTadmin] Official Update 2022-01
// 
// 
// 0 // Body
// 
// 1 16 0 -.25 0 17 0 0 0 .25 0 0 0 14 box3u12.dat
  [1,16,0,-.25,0,17,0,0,0,.25,0,0,0,14, ldraw_lib__box3u12()],
// 1 16 17 0 -13 1 0 0 0 -1 0 0 0 -1 1-4chrd.dat
  [1,16,17,0,-13,1,0,0,0,-1,0,0,0,-1, ldraw_lib__1_4chrd()],
// 1 16 17 0 13 1 0 0 0 -1 0 0 0 1 1-4chrd.dat
  [1,16,17,0,13,1,0,0,0,-1,0,0,0,1, ldraw_lib__1_4chrd()],
// 1 16 -17 0 13 -1 0 0 0 -1 0 0 0 1 1-4chrd.dat
  [1,16,-17,0,13,-1,0,0,0,-1,0,0,0,1, ldraw_lib__1_4chrd()],
// 1 16 -17 0 -13 -1 0 0 0 -1 0 0 0 -1 1-4chrd.dat
  [1,16,-17,0,-13,-1,0,0,0,-1,0,0,0,-1, ldraw_lib__1_4chrd()],
// 1 16 17 -.25 -13 1 0 0 0 .25 0 0 0 -1 1-4cyli.dat
  [1,16,17,-.25,-13,1,0,0,0,.25,0,0,0,-1, ldraw_lib__1_4cyli()],
// 1 16 17 -.25 13 1 0 0 0 .25 0 0 0 1 1-4cyli.dat
  [1,16,17,-.25,13,1,0,0,0,.25,0,0,0,1, ldraw_lib__1_4cyli()],
// 1 16 -17 -.25 13 -1 0 0 0 .25 0 0 0 1 1-4cyli.dat
  [1,16,-17,-.25,13,-1,0,0,0,.25,0,0,0,1, ldraw_lib__1_4cyli()],
// 1 16 -17 -.25 -13 -1 0 0 0 .25 0 0 0 -1 1-4cyli.dat
  [1,16,-17,-.25,-13,-1,0,0,0,.25,0,0,0,-1, ldraw_lib__1_4cyli()],
// 4 16 17 0 14 18 0 13 18 0 -13 17 0 -14
  [4,16,17,0,14,18,0,13,18,0,-13,17,0,-14],
// 4 16 -17 0 -14 -18 0 -13 -18 0 13 -17 0 14
  [4,16,-17,0,-14,-18,0,-13,-18,0,13,-17,0,14],
// 4 16 18 0 13 18 -.25 13 18 -.25 -13 18 0 -13
  [4,16,18,0,13,18,-.25,13,18,-.25,-13,18,0,-13],
// 4 16 -18 0 -13 -18 -.25 -13 -18 -.25 13 -18 0 13
  [4,16,-18,0,-13,-18,-.25,-13,-18,-.25,13,-18,0,13],
// 
// 0 // Frontface
// 0 // Text
// 1 15 -9.2 -.25 5.9 7.5 0 0 0 1 0 0 0 7.5 type-swiss721bt-bold-um.dat
  [1,15,-9.2,-.25,5.9,7.5,0,0,0,1,0,0,0,7.5, ldraw_lib__type_swiss721bt_bold_um()],
// 1 15 -1.7 -.25 5.9 7.5 0 0 0 1 0 0 0 7.5 type-swiss721bt-bold-ut.dat
  [1,15,-1.7,-.25,5.9,7.5,0,0,0,1,0,0,0,7.5, ldraw_lib__type_swiss721bt_bold_ut()],
// 1 15 -10.8 -.25 -4.6 8.8 0 0 0 1 0 0 0 8.8 type-swiss721bt-bold-n5.dat
  [1,15,-10.8,-.25,-4.6,8.8,0,0,0,1,0,0,0,8.8, ldraw_lib__type_swiss721bt_bold_n5()],
// 1 15 -3.8 -.25 -4.6 8.8 0 0 0 1 0 0 0 8.8 type-swiss721bt-bold-n5.dat
  [1,15,-3.8,-.25,-4.6,8.8,0,0,0,1,0,0,0,8.8, ldraw_lib__type_swiss721bt_bold_n5()],
// 1 15 3.28 -.25 -4.6 8.8 0 0 0 1 0 0 0 8.8 type-swiss721bt-bold-n6.dat
  [1,15,3.28,-.25,-4.6,8.8,0,0,0,1,0,0,0,8.8, ldraw_lib__type_swiss721bt_bold_n6()],
// 1 15 10.5 -.25 -4.6 8.8 0 0 0 1 0 0 0 8.8 type-swiss721bt-bold-n3.dat
  [1,15,10.5,-.25,-4.6,8.8,0,0,0,1,0,0,0,8.8, ldraw_lib__type_swiss721bt_bold_n3()],
// 
// 0 // Black
// 1 0 17 -.25 -13 1 0 0 0 1 0 0 0 -1 1-4chrd.dat
  [1,0,17,-.25,-13,1,0,0,0,1,0,0,0,-1, ldraw_lib__1_4chrd()],
// 1 0 17 -.25 13 1 0 0 0 1 0 0 0 1 1-4chrd.dat
  [1,0,17,-.25,13,1,0,0,0,1,0,0,0,1, ldraw_lib__1_4chrd()],
// 1 0 -17 -.25 13 -1 0 0 0 1 0 0 0 1 1-4chrd.dat
  [1,0,-17,-.25,13,-1,0,0,0,1,0,0,0,1, ldraw_lib__1_4chrd()],
// 1 0 -17 -.25 -13 -1 0 0 0 1 0 0 0 -1 1-4chrd.dat
  [1,0,-17,-.25,-13,-1,0,0,0,1,0,0,0,-1, ldraw_lib__1_4chrd()],
// 4 0 -17 -.25 14 -15.5 -.25 11.5 15.5 -.25 11.5 17 -.25 14
  [4,0,-17,-.25,14,-15.5,-.25,11.5,15.5,-.25,11.5,17,-.25,14],
// 4 0 15.5 -.25 -11.5 -15.5 -.25 -11.5 -17 -.25 -14 17 -.25 -14
  [4,0,15.5,-.25,-11.5,-15.5,-.25,-11.5,-17,-.25,-14,17,-.25,-14],
// 4 0 18 -.25 -13 18 -.25 13 17 -.25 14 17 -.25 -14
  [4,0,18,-.25,-13,18,-.25,13,17,-.25,14,17,-.25,-14],
// 4 0 -18 -.25 13 -18 -.25 -13 -17 -.25 -14 -17 -.25 14
  [4,0,-18,-.25,13,-18,-.25,-13,-17,-.25,-14,-17,-.25,14],
// 4 0 -17 -.25 -14 -15.5 -.25 -11.5 -15.5 -.25 11.5 -17 -.25 14
  [4,0,-17,-.25,-14,-15.5,-.25,-11.5,-15.5,-.25,11.5,-17,-.25,14],
// 4 0 15.5 -.25 11.5 15.5 -.25 -11.5 17 -.25 -14 17 -.25 14
  [4,0,15.5,-.25,11.5,15.5,-.25,-11.5,17,-.25,-14,17,-.25,14],
// 
// 0 // White
// 4 15 .2 -.25 -9 -.6496 -.25 -9 -15.5 -.25 -11.5 15.5 -.25 -11.5
  [4,15,.2,-.25,-9,-.6496,-.25,-9,-15.5,-.25,-11.5,15.5,-.25,-11.5],
// 4 15 -6.9504 -.25 -.2 -6.088 -.25 -.2 -4.6925 -.25 2.15 -5.45 -.25 2.15
  [4,15,-6.9504,-.25,-.2,-6.088,-.25,-.2,-4.6925,-.25,2.15,-5.45,-.25,2.15],
// 4 15 -11.525 -.25 2.15 -12.95 -.25 2.15 -13.9504 -.25 -.2 -13.088 -.25 -.2
  [4,15,-11.525,-.25,2.15,-12.95,-.25,2.15,-13.9504,-.25,-.2,-13.088,-.25,-.2],
// 4 15 -7.6496 -.25 -.2 -6.9504 -.25 -.2 -8.4125 -.25 2.15 -9.9875 -.25 2.15
  [4,15,-7.6496,-.25,-.2,-6.9504,-.25,-.2,-8.4125,-.25,2.15,-9.9875,-.25,2.15],
// 3 15 -9.9875 -.25 2.15 -8.0192 -.25 -.2 -7.6496 -.25 -.2
  [3,15,-9.9875,-.25,2.15,-8.0192,-.25,-.2,-7.6496,-.25,-.2],
// 4 15 -11.525 -.25 2.15 -13.088 -.25 -.2 -8.0192 -.25 -.2 -9.9875 -.25 2.15
  [4,15,-11.525,-.25,2.15,-13.088,-.25,-.2,-8.0192,-.25,-.2,-9.9875,-.25,2.15],
// 3 15 -3.932 -.25 -9 -15.5 -.25 -11.5 -.6496 -.25 -9
  [3,15,-3.932,-.25,-9,-15.5,-.25,-11.5,-.6496,-.25,-9],
// 3 15 -6.9504 -.25 -9 -15.5 -.25 -11.5 -3.932 -.25 -9
  [3,15,-6.9504,-.25,-9,-15.5,-.25,-11.5,-3.932,-.25,-9],
// 3 15 -7.6496 -.25 -9 -15.5 -.25 -11.5 -6.9504 -.25 -9
  [3,15,-7.6496,-.25,-9,-15.5,-.25,-11.5,-6.9504,-.25,-9],
// 3 15 -10.932 -.25 -9 -15.5 -.25 -11.5 -7.6496 -.25 -9
  [3,15,-10.932,-.25,-9,-15.5,-.25,-11.5,-7.6496,-.25,-9],
// 3 15 -13.9504 -.25 -9 -15.5 -.25 -11.5 -10.932 -.25 -9
  [3,15,-13.9504,-.25,-9,-15.5,-.25,-11.5,-10.932,-.25,-9],
// 4 15 -15.5 -.25 11.5 -15.5 -.25 -11.5 -13.9504 -.25 -6.3864 -13.9504 -.25 -.2
  [4,15,-15.5,-.25,11.5,-15.5,-.25,-11.5,-13.9504,-.25,-6.3864,-13.9504,-.25,-.2],
// 3 15 -15.5 -.25 -11.5 -13.9504 -.25 -9 -13.9504 -.25 -6.3864
  [3,15,-15.5,-.25,-11.5,-13.9504,-.25,-9,-13.9504,-.25,-6.3864],
// 4 15 15.5 -.25 11.5 13.58 -.25 -.2 13.58 -.25 -6.2104 15.5 -.25 -11.5
  [4,15,15.5,-.25,11.5,13.58,-.25,-.2,13.58,-.25,-6.2104,15.5,-.25,-11.5],
// 3 15 10.5 -.25 -9 15.5 -.25 -11.5 13.58 -.25 -9
  [3,15,10.5,-.25,-9,15.5,-.25,-11.5,13.58,-.25,-9],
// 3 15 7.42 -.25 -9 15.5 -.25 -11.5 10.5 -.25 -9
  [3,15,7.42,-.25,-9,15.5,-.25,-11.5,10.5,-.25,-9],
// 4 15 -4.6925 -.25 9.65 1.2925 -.25 9.65 15.5 -.25 11.5 -15.5 -.25 11.5
  [4,15,-4.6925,-.25,9.65,1.2925,-.25,9.65,15.5,-.25,11.5,-15.5,-.25,11.5],
// 3 15 13.58 -.25 -.2 15.5 -.25 11.5 10.5 -.25 -.2
  [3,15,13.58,-.25,-.2,15.5,-.25,11.5,10.5,-.25,-.2],
// 3 15 -10.67 -.25 9.65 -15.5 -.25 11.5 -12.95 -.25 9.65
  [3,15,-10.67,-.25,9.65,-15.5,-.25,11.5,-12.95,-.25,9.65],
// 3 15 -7.73 -.25 9.65 -15.5 -.25 11.5 -10.67 -.25 9.65
  [3,15,-7.73,-.25,9.65,-15.5,-.25,11.5,-10.67,-.25,9.65],
// 3 15 -5.45 -.25 9.65 -15.5 -.25 11.5 -7.73 -.25 9.65
  [3,15,-5.45,-.25,9.65,-15.5,-.25,11.5,-7.73,-.25,9.65],
// 3 15 -4.6925 -.25 9.65 -15.5 -.25 11.5 -5.45 -.25 9.65
  [3,15,-4.6925,-.25,9.65,-15.5,-.25,11.5,-5.45,-.25,9.65],
// 4 15 15.5 -.25 11.5 1.2925 -.25 2.15 3.5528 -.25 -.2 6.36 -.25 -.2
  [4,15,15.5,-.25,11.5,1.2925,-.25,2.15,3.5528,-.25,-.2,6.36,-.25,-.2],
// 3 15 3.5528 -.25 -.2 1.2925 -.25 2.15 .2 -.25 -.2
  [3,15,3.5528,-.25,-.2,1.2925,-.25,2.15,.2,-.25,-.2],
// 3 15 -2.4575 -.25 2.15 -4.6925 -.25 2.15 -6.088 -.25 -.2
  [3,15,-2.4575,-.25,2.15,-4.6925,-.25,2.15,-6.088,-.25,-.2],
// 3 15 6.36 -.25 -.2 7.42 -.25 -.2 15.5 -.25 11.5
  [3,15,6.36,-.25,-.2,7.42,-.25,-.2,15.5,-.25,11.5],
// 3 15 15.5 -.25 11.5 7.42 -.25 -.2 10.5 -.25 -.2
  [3,15,15.5,-.25,11.5,7.42,-.25,-.2,10.5,-.25,-.2],
// 3 15 1.2925 -.25 9.65 1.2925 -.25 8.315 15.5 -.25 11.5
  [3,15,1.2925,-.25,9.65,1.2925,-.25,8.315,15.5,-.25,11.5],
// 3 15 15.5 -.25 11.5 1.2925 -.25 8.315 1.2925 -.25 2.15
  [3,15,15.5,-.25,11.5,1.2925,-.25,8.315,1.2925,-.25,2.15],
// 3 15 1.2925 -.25 2.15 -.6496 -.25 -.2 .2 -.25 -.2
  [3,15,1.2925,-.25,2.15,-.6496,-.25,-.2,.2,-.25,-.2],
// 4 15 -.6496 -.25 -.2 1.2925 -.25 2.15 -.9125 -.25 2.15 -1.0192 -.25 -.2
  [4,15,-.6496,-.25,-.2,1.2925,-.25,2.15,-.9125,-.25,2.15,-1.0192,-.25,-.2],
// 4 15 -2.4575 -.25 2.15 -6.088 -.25 -.2 -1.0192 -.25 -.2 -.9125 -.25 2.15
  [4,15,-2.4575,-.25,2.15,-6.088,-.25,-.2,-1.0192,-.25,-.2,-.9125,-.25,2.15],
// 3 15 -6.875 -.25 2.15 -6.9504 -.25 -.2 -5.45 -.25 2.15
  [3,15,-6.875,-.25,2.15,-6.9504,-.25,-.2,-5.45,-.25,2.15],
// 3 15 -6.9504 -.25 -.2 -6.875 -.25 2.15 -8.4125 -.25 2.15
  [3,15,-6.9504,-.25,-.2,-6.875,-.25,2.15,-8.4125,-.25,2.15],
// 4 15 -6.9504 -.25 -.2 -7.6496 -.25 -.2 -7.6496 -.25 -5.8936 -6.9504 -.25 -6.3864
  [4,15,-6.9504,-.25,-.2,-7.6496,-.25,-.2,-7.6496,-.25,-5.8936,-6.9504,-.25,-6.3864],
// 4 15 -7.6496 -.25 -9 -6.9504 -.25 -9 -6.9504 -.25 -6.3864 -7.6496 -.25 -5.8936
  [4,15,-7.6496,-.25,-9,-6.9504,-.25,-9,-6.9504,-.25,-6.3864,-7.6496,-.25,-5.8936],
// 4 15 -4.6925 -.25 9.65 -5.45 -.25 9.65 -5.45 -.25 2.15 -4.6925 -.25 8.315
  [4,15,-4.6925,-.25,9.65,-5.45,-.25,9.65,-5.45,-.25,2.15,-4.6925,-.25,8.315],
// 3 15 -4.6925 -.25 8.315 -5.45 -.25 2.15 -4.6925 -.25 2.15
  [3,15,-4.6925,-.25,8.315,-5.45,-.25,2.15,-4.6925,-.25,2.15],
// 4 15 6.36 -.25 -.2 6.36 -.25 -6.008 7.42 -.25 -6.1488 7.42 -.25 -.2
  [4,15,6.36,-.25,-.2,6.36,-.25,-6.008,7.42,-.25,-6.1488,7.42,-.25,-.2],
// 4 15 6.36 -.25 -6.008 6.36 -.25 -9 7.42 -.25 -9 7.42 -.25 -6.1488
  [4,15,6.36,-.25,-6.008,6.36,-.25,-9,7.42,-.25,-9,7.42,-.25,-6.1488],
// 3 15 7.42 -.25 -9 6.36 -.25 -9 15.5 -.25 -11.5
  [3,15,7.42,-.25,-9,6.36,-.25,-9,15.5,-.25,-11.5],
// 3 15 15.5 -.25 -11.5 6.36 -.25 -9 3.368 -.25 -9
  [3,15,15.5,-.25,-11.5,6.36,-.25,-9,3.368,-.25,-9],
// 3 15 15.5 -.25 -11.5 3.368 -.25 -9 .2 -.25 -9
  [3,15,15.5,-.25,-11.5,3.368,-.25,-9,.2,-.25,-9],
// 3 15 13.58 -.25 -6.2104 13.58 -.25 -9 15.5 -.25 -11.5
  [3,15,13.58,-.25,-6.2104,13.58,-.25,-9,15.5,-.25,-11.5],
// 4 15 .2 -.25 -.2 -.6496 -.25 -.2 -.6496 -.25 -5.8936 .2 -.25 -4.7848
  [4,15,.2,-.25,-.2,-.6496,-.25,-.2,-.6496,-.25,-5.8936,.2,-.25,-4.7848],
// 4 15 .2 -.25 -4.7848 -.6496 -.25 -5.8936 -.6496 -.25 -9 .2 -.25 -9
  [4,15,.2,-.25,-4.7848,-.6496,-.25,-5.8936,-.6496,-.25,-9,.2,-.25,-9],
// 4 15 -15.5 -.25 11.5 -13.9504 -.25 -.2 -12.95 -.25 2.15 -12.95 -.25 9.65
  [4,15,-15.5,-.25,11.5,-13.9504,-.25,-.2,-12.95,-.25,2.15,-12.95,-.25,9.65],
];
module ldraw_lib__4121723i(step=0, col=false, unit=2/5, alt=false, line=0.2, solid=!$preview)
    makepoly(ldraw_lib__4121723i(), step=step, col=col, unit=unit, alt=alt, line=line, solid=solid);
ldraw_lib__4121723i(line=0.2);
